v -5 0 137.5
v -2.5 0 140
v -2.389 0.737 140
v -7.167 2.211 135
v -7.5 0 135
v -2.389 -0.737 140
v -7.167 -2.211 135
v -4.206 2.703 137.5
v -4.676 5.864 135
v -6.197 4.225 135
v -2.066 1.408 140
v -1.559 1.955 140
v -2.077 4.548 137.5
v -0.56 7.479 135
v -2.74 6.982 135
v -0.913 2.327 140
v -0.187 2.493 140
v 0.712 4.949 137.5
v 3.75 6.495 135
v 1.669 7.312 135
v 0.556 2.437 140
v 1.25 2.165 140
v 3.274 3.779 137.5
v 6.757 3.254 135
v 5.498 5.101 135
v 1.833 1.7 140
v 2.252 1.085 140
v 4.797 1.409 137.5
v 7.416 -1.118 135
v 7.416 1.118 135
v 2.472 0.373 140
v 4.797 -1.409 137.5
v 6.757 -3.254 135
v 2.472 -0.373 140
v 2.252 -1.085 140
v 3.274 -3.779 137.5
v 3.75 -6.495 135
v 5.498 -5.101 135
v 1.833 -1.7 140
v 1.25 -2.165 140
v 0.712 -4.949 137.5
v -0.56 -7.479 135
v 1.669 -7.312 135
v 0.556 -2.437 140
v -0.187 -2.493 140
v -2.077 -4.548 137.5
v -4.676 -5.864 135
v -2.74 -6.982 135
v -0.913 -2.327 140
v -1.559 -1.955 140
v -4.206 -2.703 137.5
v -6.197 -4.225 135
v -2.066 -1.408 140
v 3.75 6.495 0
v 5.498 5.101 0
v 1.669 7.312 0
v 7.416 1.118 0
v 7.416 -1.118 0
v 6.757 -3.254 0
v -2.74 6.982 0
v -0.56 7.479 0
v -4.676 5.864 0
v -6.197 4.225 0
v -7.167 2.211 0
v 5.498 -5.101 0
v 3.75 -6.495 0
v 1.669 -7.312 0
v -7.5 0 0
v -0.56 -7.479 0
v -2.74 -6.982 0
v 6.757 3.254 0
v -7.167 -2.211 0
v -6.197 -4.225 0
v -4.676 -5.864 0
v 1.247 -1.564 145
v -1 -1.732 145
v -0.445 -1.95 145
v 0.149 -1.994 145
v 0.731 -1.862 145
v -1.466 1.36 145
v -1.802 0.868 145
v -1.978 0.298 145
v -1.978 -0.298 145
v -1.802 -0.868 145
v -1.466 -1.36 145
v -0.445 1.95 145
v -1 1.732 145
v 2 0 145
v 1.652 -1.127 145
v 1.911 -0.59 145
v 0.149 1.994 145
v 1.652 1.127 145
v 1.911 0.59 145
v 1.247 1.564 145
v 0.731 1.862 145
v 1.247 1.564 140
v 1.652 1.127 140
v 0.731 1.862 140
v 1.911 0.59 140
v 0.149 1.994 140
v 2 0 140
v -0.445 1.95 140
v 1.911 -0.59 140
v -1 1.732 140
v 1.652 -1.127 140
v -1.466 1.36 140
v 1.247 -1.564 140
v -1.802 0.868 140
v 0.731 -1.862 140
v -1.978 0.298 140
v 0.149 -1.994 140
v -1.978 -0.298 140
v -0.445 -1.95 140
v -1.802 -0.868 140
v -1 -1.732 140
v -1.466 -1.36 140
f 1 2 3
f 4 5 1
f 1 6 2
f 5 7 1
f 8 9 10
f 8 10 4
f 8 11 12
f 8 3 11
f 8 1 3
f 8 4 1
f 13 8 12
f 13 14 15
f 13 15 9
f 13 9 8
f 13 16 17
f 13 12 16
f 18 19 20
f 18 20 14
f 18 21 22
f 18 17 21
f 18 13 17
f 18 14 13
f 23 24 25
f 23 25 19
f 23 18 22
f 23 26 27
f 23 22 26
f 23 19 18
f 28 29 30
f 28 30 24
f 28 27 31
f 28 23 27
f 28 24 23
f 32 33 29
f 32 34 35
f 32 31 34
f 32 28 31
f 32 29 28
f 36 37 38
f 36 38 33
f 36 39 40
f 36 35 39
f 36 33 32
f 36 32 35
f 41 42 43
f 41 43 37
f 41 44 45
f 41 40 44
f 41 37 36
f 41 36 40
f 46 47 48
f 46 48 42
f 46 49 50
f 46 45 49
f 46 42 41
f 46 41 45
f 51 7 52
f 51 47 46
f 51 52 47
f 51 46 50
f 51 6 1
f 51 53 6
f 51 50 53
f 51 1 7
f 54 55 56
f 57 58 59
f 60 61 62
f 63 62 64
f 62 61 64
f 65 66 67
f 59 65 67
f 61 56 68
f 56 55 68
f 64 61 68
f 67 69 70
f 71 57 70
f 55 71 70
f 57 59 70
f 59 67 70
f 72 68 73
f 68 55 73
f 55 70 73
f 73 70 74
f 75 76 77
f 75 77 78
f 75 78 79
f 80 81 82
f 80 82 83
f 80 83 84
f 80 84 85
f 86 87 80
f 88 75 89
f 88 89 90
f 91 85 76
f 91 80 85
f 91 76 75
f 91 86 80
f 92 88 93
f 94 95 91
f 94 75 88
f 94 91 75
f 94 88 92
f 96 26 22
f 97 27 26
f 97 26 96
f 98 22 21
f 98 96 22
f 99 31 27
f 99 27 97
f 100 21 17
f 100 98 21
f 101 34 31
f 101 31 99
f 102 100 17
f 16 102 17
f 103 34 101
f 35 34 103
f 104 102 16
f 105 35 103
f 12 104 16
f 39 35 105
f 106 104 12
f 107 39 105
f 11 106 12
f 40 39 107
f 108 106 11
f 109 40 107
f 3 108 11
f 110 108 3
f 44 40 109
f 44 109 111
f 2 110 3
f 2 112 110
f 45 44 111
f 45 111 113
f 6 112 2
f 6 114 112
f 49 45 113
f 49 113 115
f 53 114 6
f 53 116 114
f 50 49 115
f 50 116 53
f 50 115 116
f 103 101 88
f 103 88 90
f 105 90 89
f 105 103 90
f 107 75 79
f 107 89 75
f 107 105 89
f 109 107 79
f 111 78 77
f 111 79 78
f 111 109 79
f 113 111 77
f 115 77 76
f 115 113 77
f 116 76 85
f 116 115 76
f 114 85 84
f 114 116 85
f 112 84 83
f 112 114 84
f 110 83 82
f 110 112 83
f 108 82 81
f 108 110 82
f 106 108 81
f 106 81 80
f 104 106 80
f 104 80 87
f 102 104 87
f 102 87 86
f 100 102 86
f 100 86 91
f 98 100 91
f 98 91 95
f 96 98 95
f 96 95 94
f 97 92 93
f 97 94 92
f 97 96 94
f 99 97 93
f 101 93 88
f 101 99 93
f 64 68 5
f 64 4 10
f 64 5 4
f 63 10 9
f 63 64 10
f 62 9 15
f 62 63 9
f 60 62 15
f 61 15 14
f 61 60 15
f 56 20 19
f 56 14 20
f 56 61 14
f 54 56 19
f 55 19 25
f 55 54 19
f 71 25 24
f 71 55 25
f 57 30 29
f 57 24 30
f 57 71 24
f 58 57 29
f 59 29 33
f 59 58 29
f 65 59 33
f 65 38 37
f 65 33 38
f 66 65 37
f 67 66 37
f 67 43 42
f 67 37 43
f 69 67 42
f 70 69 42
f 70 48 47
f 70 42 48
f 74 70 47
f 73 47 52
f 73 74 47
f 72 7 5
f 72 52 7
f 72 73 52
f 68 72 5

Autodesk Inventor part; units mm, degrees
ref_plane "YZ Plane" through (0, 0, 0) normal (1, 0, 0) x (0, 1, 0)
ref_plane "XZ Plane" through (0, 0, 0) normal (0, 1, 0) x (-1, 0, 0)
ref_plane "XY Plane" through (0, 0, 0) normal (0, 0, 1) x (1, 0, 0)
sketch "Sketch2" plane through (0, 0, 0) normal (0, 0, 1) x (-1, 0, 0)
  circle A0 centre (0, 0) radius 7.5
  dimension "d0" = 15
extrude "Extrusion1" add sketch "Sketch2" along normal blind 140
sketch "Sketch3" plane through (0, 0, 140) normal (0, 0, 1) x (1, 0, 0)
  circle A0 centre (0, 0) radius 2
  dimension "d3" = 4
extrude "Extrusion2" add sketch "Sketch3" along normal blind 5
chamfer "Chamfer1" distance 5 angle 45 1 edges at (7.5, 0, 140)
properties part number "Marcador"
